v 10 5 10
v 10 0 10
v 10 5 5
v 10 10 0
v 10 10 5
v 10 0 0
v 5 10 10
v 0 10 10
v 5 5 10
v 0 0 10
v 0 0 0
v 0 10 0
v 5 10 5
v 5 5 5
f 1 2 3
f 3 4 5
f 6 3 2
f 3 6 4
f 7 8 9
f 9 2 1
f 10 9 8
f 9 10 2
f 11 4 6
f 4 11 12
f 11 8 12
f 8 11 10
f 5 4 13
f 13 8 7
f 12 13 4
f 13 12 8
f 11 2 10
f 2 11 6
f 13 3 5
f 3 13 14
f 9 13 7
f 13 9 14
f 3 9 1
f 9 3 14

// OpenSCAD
/*
 * The debug modifier outlines the modified object for easier inspection.
 */

difference() {
    cube([10, 10, 10]);

    #translate([5, 5, 5])
        cube([10, 10, 10]);
}
